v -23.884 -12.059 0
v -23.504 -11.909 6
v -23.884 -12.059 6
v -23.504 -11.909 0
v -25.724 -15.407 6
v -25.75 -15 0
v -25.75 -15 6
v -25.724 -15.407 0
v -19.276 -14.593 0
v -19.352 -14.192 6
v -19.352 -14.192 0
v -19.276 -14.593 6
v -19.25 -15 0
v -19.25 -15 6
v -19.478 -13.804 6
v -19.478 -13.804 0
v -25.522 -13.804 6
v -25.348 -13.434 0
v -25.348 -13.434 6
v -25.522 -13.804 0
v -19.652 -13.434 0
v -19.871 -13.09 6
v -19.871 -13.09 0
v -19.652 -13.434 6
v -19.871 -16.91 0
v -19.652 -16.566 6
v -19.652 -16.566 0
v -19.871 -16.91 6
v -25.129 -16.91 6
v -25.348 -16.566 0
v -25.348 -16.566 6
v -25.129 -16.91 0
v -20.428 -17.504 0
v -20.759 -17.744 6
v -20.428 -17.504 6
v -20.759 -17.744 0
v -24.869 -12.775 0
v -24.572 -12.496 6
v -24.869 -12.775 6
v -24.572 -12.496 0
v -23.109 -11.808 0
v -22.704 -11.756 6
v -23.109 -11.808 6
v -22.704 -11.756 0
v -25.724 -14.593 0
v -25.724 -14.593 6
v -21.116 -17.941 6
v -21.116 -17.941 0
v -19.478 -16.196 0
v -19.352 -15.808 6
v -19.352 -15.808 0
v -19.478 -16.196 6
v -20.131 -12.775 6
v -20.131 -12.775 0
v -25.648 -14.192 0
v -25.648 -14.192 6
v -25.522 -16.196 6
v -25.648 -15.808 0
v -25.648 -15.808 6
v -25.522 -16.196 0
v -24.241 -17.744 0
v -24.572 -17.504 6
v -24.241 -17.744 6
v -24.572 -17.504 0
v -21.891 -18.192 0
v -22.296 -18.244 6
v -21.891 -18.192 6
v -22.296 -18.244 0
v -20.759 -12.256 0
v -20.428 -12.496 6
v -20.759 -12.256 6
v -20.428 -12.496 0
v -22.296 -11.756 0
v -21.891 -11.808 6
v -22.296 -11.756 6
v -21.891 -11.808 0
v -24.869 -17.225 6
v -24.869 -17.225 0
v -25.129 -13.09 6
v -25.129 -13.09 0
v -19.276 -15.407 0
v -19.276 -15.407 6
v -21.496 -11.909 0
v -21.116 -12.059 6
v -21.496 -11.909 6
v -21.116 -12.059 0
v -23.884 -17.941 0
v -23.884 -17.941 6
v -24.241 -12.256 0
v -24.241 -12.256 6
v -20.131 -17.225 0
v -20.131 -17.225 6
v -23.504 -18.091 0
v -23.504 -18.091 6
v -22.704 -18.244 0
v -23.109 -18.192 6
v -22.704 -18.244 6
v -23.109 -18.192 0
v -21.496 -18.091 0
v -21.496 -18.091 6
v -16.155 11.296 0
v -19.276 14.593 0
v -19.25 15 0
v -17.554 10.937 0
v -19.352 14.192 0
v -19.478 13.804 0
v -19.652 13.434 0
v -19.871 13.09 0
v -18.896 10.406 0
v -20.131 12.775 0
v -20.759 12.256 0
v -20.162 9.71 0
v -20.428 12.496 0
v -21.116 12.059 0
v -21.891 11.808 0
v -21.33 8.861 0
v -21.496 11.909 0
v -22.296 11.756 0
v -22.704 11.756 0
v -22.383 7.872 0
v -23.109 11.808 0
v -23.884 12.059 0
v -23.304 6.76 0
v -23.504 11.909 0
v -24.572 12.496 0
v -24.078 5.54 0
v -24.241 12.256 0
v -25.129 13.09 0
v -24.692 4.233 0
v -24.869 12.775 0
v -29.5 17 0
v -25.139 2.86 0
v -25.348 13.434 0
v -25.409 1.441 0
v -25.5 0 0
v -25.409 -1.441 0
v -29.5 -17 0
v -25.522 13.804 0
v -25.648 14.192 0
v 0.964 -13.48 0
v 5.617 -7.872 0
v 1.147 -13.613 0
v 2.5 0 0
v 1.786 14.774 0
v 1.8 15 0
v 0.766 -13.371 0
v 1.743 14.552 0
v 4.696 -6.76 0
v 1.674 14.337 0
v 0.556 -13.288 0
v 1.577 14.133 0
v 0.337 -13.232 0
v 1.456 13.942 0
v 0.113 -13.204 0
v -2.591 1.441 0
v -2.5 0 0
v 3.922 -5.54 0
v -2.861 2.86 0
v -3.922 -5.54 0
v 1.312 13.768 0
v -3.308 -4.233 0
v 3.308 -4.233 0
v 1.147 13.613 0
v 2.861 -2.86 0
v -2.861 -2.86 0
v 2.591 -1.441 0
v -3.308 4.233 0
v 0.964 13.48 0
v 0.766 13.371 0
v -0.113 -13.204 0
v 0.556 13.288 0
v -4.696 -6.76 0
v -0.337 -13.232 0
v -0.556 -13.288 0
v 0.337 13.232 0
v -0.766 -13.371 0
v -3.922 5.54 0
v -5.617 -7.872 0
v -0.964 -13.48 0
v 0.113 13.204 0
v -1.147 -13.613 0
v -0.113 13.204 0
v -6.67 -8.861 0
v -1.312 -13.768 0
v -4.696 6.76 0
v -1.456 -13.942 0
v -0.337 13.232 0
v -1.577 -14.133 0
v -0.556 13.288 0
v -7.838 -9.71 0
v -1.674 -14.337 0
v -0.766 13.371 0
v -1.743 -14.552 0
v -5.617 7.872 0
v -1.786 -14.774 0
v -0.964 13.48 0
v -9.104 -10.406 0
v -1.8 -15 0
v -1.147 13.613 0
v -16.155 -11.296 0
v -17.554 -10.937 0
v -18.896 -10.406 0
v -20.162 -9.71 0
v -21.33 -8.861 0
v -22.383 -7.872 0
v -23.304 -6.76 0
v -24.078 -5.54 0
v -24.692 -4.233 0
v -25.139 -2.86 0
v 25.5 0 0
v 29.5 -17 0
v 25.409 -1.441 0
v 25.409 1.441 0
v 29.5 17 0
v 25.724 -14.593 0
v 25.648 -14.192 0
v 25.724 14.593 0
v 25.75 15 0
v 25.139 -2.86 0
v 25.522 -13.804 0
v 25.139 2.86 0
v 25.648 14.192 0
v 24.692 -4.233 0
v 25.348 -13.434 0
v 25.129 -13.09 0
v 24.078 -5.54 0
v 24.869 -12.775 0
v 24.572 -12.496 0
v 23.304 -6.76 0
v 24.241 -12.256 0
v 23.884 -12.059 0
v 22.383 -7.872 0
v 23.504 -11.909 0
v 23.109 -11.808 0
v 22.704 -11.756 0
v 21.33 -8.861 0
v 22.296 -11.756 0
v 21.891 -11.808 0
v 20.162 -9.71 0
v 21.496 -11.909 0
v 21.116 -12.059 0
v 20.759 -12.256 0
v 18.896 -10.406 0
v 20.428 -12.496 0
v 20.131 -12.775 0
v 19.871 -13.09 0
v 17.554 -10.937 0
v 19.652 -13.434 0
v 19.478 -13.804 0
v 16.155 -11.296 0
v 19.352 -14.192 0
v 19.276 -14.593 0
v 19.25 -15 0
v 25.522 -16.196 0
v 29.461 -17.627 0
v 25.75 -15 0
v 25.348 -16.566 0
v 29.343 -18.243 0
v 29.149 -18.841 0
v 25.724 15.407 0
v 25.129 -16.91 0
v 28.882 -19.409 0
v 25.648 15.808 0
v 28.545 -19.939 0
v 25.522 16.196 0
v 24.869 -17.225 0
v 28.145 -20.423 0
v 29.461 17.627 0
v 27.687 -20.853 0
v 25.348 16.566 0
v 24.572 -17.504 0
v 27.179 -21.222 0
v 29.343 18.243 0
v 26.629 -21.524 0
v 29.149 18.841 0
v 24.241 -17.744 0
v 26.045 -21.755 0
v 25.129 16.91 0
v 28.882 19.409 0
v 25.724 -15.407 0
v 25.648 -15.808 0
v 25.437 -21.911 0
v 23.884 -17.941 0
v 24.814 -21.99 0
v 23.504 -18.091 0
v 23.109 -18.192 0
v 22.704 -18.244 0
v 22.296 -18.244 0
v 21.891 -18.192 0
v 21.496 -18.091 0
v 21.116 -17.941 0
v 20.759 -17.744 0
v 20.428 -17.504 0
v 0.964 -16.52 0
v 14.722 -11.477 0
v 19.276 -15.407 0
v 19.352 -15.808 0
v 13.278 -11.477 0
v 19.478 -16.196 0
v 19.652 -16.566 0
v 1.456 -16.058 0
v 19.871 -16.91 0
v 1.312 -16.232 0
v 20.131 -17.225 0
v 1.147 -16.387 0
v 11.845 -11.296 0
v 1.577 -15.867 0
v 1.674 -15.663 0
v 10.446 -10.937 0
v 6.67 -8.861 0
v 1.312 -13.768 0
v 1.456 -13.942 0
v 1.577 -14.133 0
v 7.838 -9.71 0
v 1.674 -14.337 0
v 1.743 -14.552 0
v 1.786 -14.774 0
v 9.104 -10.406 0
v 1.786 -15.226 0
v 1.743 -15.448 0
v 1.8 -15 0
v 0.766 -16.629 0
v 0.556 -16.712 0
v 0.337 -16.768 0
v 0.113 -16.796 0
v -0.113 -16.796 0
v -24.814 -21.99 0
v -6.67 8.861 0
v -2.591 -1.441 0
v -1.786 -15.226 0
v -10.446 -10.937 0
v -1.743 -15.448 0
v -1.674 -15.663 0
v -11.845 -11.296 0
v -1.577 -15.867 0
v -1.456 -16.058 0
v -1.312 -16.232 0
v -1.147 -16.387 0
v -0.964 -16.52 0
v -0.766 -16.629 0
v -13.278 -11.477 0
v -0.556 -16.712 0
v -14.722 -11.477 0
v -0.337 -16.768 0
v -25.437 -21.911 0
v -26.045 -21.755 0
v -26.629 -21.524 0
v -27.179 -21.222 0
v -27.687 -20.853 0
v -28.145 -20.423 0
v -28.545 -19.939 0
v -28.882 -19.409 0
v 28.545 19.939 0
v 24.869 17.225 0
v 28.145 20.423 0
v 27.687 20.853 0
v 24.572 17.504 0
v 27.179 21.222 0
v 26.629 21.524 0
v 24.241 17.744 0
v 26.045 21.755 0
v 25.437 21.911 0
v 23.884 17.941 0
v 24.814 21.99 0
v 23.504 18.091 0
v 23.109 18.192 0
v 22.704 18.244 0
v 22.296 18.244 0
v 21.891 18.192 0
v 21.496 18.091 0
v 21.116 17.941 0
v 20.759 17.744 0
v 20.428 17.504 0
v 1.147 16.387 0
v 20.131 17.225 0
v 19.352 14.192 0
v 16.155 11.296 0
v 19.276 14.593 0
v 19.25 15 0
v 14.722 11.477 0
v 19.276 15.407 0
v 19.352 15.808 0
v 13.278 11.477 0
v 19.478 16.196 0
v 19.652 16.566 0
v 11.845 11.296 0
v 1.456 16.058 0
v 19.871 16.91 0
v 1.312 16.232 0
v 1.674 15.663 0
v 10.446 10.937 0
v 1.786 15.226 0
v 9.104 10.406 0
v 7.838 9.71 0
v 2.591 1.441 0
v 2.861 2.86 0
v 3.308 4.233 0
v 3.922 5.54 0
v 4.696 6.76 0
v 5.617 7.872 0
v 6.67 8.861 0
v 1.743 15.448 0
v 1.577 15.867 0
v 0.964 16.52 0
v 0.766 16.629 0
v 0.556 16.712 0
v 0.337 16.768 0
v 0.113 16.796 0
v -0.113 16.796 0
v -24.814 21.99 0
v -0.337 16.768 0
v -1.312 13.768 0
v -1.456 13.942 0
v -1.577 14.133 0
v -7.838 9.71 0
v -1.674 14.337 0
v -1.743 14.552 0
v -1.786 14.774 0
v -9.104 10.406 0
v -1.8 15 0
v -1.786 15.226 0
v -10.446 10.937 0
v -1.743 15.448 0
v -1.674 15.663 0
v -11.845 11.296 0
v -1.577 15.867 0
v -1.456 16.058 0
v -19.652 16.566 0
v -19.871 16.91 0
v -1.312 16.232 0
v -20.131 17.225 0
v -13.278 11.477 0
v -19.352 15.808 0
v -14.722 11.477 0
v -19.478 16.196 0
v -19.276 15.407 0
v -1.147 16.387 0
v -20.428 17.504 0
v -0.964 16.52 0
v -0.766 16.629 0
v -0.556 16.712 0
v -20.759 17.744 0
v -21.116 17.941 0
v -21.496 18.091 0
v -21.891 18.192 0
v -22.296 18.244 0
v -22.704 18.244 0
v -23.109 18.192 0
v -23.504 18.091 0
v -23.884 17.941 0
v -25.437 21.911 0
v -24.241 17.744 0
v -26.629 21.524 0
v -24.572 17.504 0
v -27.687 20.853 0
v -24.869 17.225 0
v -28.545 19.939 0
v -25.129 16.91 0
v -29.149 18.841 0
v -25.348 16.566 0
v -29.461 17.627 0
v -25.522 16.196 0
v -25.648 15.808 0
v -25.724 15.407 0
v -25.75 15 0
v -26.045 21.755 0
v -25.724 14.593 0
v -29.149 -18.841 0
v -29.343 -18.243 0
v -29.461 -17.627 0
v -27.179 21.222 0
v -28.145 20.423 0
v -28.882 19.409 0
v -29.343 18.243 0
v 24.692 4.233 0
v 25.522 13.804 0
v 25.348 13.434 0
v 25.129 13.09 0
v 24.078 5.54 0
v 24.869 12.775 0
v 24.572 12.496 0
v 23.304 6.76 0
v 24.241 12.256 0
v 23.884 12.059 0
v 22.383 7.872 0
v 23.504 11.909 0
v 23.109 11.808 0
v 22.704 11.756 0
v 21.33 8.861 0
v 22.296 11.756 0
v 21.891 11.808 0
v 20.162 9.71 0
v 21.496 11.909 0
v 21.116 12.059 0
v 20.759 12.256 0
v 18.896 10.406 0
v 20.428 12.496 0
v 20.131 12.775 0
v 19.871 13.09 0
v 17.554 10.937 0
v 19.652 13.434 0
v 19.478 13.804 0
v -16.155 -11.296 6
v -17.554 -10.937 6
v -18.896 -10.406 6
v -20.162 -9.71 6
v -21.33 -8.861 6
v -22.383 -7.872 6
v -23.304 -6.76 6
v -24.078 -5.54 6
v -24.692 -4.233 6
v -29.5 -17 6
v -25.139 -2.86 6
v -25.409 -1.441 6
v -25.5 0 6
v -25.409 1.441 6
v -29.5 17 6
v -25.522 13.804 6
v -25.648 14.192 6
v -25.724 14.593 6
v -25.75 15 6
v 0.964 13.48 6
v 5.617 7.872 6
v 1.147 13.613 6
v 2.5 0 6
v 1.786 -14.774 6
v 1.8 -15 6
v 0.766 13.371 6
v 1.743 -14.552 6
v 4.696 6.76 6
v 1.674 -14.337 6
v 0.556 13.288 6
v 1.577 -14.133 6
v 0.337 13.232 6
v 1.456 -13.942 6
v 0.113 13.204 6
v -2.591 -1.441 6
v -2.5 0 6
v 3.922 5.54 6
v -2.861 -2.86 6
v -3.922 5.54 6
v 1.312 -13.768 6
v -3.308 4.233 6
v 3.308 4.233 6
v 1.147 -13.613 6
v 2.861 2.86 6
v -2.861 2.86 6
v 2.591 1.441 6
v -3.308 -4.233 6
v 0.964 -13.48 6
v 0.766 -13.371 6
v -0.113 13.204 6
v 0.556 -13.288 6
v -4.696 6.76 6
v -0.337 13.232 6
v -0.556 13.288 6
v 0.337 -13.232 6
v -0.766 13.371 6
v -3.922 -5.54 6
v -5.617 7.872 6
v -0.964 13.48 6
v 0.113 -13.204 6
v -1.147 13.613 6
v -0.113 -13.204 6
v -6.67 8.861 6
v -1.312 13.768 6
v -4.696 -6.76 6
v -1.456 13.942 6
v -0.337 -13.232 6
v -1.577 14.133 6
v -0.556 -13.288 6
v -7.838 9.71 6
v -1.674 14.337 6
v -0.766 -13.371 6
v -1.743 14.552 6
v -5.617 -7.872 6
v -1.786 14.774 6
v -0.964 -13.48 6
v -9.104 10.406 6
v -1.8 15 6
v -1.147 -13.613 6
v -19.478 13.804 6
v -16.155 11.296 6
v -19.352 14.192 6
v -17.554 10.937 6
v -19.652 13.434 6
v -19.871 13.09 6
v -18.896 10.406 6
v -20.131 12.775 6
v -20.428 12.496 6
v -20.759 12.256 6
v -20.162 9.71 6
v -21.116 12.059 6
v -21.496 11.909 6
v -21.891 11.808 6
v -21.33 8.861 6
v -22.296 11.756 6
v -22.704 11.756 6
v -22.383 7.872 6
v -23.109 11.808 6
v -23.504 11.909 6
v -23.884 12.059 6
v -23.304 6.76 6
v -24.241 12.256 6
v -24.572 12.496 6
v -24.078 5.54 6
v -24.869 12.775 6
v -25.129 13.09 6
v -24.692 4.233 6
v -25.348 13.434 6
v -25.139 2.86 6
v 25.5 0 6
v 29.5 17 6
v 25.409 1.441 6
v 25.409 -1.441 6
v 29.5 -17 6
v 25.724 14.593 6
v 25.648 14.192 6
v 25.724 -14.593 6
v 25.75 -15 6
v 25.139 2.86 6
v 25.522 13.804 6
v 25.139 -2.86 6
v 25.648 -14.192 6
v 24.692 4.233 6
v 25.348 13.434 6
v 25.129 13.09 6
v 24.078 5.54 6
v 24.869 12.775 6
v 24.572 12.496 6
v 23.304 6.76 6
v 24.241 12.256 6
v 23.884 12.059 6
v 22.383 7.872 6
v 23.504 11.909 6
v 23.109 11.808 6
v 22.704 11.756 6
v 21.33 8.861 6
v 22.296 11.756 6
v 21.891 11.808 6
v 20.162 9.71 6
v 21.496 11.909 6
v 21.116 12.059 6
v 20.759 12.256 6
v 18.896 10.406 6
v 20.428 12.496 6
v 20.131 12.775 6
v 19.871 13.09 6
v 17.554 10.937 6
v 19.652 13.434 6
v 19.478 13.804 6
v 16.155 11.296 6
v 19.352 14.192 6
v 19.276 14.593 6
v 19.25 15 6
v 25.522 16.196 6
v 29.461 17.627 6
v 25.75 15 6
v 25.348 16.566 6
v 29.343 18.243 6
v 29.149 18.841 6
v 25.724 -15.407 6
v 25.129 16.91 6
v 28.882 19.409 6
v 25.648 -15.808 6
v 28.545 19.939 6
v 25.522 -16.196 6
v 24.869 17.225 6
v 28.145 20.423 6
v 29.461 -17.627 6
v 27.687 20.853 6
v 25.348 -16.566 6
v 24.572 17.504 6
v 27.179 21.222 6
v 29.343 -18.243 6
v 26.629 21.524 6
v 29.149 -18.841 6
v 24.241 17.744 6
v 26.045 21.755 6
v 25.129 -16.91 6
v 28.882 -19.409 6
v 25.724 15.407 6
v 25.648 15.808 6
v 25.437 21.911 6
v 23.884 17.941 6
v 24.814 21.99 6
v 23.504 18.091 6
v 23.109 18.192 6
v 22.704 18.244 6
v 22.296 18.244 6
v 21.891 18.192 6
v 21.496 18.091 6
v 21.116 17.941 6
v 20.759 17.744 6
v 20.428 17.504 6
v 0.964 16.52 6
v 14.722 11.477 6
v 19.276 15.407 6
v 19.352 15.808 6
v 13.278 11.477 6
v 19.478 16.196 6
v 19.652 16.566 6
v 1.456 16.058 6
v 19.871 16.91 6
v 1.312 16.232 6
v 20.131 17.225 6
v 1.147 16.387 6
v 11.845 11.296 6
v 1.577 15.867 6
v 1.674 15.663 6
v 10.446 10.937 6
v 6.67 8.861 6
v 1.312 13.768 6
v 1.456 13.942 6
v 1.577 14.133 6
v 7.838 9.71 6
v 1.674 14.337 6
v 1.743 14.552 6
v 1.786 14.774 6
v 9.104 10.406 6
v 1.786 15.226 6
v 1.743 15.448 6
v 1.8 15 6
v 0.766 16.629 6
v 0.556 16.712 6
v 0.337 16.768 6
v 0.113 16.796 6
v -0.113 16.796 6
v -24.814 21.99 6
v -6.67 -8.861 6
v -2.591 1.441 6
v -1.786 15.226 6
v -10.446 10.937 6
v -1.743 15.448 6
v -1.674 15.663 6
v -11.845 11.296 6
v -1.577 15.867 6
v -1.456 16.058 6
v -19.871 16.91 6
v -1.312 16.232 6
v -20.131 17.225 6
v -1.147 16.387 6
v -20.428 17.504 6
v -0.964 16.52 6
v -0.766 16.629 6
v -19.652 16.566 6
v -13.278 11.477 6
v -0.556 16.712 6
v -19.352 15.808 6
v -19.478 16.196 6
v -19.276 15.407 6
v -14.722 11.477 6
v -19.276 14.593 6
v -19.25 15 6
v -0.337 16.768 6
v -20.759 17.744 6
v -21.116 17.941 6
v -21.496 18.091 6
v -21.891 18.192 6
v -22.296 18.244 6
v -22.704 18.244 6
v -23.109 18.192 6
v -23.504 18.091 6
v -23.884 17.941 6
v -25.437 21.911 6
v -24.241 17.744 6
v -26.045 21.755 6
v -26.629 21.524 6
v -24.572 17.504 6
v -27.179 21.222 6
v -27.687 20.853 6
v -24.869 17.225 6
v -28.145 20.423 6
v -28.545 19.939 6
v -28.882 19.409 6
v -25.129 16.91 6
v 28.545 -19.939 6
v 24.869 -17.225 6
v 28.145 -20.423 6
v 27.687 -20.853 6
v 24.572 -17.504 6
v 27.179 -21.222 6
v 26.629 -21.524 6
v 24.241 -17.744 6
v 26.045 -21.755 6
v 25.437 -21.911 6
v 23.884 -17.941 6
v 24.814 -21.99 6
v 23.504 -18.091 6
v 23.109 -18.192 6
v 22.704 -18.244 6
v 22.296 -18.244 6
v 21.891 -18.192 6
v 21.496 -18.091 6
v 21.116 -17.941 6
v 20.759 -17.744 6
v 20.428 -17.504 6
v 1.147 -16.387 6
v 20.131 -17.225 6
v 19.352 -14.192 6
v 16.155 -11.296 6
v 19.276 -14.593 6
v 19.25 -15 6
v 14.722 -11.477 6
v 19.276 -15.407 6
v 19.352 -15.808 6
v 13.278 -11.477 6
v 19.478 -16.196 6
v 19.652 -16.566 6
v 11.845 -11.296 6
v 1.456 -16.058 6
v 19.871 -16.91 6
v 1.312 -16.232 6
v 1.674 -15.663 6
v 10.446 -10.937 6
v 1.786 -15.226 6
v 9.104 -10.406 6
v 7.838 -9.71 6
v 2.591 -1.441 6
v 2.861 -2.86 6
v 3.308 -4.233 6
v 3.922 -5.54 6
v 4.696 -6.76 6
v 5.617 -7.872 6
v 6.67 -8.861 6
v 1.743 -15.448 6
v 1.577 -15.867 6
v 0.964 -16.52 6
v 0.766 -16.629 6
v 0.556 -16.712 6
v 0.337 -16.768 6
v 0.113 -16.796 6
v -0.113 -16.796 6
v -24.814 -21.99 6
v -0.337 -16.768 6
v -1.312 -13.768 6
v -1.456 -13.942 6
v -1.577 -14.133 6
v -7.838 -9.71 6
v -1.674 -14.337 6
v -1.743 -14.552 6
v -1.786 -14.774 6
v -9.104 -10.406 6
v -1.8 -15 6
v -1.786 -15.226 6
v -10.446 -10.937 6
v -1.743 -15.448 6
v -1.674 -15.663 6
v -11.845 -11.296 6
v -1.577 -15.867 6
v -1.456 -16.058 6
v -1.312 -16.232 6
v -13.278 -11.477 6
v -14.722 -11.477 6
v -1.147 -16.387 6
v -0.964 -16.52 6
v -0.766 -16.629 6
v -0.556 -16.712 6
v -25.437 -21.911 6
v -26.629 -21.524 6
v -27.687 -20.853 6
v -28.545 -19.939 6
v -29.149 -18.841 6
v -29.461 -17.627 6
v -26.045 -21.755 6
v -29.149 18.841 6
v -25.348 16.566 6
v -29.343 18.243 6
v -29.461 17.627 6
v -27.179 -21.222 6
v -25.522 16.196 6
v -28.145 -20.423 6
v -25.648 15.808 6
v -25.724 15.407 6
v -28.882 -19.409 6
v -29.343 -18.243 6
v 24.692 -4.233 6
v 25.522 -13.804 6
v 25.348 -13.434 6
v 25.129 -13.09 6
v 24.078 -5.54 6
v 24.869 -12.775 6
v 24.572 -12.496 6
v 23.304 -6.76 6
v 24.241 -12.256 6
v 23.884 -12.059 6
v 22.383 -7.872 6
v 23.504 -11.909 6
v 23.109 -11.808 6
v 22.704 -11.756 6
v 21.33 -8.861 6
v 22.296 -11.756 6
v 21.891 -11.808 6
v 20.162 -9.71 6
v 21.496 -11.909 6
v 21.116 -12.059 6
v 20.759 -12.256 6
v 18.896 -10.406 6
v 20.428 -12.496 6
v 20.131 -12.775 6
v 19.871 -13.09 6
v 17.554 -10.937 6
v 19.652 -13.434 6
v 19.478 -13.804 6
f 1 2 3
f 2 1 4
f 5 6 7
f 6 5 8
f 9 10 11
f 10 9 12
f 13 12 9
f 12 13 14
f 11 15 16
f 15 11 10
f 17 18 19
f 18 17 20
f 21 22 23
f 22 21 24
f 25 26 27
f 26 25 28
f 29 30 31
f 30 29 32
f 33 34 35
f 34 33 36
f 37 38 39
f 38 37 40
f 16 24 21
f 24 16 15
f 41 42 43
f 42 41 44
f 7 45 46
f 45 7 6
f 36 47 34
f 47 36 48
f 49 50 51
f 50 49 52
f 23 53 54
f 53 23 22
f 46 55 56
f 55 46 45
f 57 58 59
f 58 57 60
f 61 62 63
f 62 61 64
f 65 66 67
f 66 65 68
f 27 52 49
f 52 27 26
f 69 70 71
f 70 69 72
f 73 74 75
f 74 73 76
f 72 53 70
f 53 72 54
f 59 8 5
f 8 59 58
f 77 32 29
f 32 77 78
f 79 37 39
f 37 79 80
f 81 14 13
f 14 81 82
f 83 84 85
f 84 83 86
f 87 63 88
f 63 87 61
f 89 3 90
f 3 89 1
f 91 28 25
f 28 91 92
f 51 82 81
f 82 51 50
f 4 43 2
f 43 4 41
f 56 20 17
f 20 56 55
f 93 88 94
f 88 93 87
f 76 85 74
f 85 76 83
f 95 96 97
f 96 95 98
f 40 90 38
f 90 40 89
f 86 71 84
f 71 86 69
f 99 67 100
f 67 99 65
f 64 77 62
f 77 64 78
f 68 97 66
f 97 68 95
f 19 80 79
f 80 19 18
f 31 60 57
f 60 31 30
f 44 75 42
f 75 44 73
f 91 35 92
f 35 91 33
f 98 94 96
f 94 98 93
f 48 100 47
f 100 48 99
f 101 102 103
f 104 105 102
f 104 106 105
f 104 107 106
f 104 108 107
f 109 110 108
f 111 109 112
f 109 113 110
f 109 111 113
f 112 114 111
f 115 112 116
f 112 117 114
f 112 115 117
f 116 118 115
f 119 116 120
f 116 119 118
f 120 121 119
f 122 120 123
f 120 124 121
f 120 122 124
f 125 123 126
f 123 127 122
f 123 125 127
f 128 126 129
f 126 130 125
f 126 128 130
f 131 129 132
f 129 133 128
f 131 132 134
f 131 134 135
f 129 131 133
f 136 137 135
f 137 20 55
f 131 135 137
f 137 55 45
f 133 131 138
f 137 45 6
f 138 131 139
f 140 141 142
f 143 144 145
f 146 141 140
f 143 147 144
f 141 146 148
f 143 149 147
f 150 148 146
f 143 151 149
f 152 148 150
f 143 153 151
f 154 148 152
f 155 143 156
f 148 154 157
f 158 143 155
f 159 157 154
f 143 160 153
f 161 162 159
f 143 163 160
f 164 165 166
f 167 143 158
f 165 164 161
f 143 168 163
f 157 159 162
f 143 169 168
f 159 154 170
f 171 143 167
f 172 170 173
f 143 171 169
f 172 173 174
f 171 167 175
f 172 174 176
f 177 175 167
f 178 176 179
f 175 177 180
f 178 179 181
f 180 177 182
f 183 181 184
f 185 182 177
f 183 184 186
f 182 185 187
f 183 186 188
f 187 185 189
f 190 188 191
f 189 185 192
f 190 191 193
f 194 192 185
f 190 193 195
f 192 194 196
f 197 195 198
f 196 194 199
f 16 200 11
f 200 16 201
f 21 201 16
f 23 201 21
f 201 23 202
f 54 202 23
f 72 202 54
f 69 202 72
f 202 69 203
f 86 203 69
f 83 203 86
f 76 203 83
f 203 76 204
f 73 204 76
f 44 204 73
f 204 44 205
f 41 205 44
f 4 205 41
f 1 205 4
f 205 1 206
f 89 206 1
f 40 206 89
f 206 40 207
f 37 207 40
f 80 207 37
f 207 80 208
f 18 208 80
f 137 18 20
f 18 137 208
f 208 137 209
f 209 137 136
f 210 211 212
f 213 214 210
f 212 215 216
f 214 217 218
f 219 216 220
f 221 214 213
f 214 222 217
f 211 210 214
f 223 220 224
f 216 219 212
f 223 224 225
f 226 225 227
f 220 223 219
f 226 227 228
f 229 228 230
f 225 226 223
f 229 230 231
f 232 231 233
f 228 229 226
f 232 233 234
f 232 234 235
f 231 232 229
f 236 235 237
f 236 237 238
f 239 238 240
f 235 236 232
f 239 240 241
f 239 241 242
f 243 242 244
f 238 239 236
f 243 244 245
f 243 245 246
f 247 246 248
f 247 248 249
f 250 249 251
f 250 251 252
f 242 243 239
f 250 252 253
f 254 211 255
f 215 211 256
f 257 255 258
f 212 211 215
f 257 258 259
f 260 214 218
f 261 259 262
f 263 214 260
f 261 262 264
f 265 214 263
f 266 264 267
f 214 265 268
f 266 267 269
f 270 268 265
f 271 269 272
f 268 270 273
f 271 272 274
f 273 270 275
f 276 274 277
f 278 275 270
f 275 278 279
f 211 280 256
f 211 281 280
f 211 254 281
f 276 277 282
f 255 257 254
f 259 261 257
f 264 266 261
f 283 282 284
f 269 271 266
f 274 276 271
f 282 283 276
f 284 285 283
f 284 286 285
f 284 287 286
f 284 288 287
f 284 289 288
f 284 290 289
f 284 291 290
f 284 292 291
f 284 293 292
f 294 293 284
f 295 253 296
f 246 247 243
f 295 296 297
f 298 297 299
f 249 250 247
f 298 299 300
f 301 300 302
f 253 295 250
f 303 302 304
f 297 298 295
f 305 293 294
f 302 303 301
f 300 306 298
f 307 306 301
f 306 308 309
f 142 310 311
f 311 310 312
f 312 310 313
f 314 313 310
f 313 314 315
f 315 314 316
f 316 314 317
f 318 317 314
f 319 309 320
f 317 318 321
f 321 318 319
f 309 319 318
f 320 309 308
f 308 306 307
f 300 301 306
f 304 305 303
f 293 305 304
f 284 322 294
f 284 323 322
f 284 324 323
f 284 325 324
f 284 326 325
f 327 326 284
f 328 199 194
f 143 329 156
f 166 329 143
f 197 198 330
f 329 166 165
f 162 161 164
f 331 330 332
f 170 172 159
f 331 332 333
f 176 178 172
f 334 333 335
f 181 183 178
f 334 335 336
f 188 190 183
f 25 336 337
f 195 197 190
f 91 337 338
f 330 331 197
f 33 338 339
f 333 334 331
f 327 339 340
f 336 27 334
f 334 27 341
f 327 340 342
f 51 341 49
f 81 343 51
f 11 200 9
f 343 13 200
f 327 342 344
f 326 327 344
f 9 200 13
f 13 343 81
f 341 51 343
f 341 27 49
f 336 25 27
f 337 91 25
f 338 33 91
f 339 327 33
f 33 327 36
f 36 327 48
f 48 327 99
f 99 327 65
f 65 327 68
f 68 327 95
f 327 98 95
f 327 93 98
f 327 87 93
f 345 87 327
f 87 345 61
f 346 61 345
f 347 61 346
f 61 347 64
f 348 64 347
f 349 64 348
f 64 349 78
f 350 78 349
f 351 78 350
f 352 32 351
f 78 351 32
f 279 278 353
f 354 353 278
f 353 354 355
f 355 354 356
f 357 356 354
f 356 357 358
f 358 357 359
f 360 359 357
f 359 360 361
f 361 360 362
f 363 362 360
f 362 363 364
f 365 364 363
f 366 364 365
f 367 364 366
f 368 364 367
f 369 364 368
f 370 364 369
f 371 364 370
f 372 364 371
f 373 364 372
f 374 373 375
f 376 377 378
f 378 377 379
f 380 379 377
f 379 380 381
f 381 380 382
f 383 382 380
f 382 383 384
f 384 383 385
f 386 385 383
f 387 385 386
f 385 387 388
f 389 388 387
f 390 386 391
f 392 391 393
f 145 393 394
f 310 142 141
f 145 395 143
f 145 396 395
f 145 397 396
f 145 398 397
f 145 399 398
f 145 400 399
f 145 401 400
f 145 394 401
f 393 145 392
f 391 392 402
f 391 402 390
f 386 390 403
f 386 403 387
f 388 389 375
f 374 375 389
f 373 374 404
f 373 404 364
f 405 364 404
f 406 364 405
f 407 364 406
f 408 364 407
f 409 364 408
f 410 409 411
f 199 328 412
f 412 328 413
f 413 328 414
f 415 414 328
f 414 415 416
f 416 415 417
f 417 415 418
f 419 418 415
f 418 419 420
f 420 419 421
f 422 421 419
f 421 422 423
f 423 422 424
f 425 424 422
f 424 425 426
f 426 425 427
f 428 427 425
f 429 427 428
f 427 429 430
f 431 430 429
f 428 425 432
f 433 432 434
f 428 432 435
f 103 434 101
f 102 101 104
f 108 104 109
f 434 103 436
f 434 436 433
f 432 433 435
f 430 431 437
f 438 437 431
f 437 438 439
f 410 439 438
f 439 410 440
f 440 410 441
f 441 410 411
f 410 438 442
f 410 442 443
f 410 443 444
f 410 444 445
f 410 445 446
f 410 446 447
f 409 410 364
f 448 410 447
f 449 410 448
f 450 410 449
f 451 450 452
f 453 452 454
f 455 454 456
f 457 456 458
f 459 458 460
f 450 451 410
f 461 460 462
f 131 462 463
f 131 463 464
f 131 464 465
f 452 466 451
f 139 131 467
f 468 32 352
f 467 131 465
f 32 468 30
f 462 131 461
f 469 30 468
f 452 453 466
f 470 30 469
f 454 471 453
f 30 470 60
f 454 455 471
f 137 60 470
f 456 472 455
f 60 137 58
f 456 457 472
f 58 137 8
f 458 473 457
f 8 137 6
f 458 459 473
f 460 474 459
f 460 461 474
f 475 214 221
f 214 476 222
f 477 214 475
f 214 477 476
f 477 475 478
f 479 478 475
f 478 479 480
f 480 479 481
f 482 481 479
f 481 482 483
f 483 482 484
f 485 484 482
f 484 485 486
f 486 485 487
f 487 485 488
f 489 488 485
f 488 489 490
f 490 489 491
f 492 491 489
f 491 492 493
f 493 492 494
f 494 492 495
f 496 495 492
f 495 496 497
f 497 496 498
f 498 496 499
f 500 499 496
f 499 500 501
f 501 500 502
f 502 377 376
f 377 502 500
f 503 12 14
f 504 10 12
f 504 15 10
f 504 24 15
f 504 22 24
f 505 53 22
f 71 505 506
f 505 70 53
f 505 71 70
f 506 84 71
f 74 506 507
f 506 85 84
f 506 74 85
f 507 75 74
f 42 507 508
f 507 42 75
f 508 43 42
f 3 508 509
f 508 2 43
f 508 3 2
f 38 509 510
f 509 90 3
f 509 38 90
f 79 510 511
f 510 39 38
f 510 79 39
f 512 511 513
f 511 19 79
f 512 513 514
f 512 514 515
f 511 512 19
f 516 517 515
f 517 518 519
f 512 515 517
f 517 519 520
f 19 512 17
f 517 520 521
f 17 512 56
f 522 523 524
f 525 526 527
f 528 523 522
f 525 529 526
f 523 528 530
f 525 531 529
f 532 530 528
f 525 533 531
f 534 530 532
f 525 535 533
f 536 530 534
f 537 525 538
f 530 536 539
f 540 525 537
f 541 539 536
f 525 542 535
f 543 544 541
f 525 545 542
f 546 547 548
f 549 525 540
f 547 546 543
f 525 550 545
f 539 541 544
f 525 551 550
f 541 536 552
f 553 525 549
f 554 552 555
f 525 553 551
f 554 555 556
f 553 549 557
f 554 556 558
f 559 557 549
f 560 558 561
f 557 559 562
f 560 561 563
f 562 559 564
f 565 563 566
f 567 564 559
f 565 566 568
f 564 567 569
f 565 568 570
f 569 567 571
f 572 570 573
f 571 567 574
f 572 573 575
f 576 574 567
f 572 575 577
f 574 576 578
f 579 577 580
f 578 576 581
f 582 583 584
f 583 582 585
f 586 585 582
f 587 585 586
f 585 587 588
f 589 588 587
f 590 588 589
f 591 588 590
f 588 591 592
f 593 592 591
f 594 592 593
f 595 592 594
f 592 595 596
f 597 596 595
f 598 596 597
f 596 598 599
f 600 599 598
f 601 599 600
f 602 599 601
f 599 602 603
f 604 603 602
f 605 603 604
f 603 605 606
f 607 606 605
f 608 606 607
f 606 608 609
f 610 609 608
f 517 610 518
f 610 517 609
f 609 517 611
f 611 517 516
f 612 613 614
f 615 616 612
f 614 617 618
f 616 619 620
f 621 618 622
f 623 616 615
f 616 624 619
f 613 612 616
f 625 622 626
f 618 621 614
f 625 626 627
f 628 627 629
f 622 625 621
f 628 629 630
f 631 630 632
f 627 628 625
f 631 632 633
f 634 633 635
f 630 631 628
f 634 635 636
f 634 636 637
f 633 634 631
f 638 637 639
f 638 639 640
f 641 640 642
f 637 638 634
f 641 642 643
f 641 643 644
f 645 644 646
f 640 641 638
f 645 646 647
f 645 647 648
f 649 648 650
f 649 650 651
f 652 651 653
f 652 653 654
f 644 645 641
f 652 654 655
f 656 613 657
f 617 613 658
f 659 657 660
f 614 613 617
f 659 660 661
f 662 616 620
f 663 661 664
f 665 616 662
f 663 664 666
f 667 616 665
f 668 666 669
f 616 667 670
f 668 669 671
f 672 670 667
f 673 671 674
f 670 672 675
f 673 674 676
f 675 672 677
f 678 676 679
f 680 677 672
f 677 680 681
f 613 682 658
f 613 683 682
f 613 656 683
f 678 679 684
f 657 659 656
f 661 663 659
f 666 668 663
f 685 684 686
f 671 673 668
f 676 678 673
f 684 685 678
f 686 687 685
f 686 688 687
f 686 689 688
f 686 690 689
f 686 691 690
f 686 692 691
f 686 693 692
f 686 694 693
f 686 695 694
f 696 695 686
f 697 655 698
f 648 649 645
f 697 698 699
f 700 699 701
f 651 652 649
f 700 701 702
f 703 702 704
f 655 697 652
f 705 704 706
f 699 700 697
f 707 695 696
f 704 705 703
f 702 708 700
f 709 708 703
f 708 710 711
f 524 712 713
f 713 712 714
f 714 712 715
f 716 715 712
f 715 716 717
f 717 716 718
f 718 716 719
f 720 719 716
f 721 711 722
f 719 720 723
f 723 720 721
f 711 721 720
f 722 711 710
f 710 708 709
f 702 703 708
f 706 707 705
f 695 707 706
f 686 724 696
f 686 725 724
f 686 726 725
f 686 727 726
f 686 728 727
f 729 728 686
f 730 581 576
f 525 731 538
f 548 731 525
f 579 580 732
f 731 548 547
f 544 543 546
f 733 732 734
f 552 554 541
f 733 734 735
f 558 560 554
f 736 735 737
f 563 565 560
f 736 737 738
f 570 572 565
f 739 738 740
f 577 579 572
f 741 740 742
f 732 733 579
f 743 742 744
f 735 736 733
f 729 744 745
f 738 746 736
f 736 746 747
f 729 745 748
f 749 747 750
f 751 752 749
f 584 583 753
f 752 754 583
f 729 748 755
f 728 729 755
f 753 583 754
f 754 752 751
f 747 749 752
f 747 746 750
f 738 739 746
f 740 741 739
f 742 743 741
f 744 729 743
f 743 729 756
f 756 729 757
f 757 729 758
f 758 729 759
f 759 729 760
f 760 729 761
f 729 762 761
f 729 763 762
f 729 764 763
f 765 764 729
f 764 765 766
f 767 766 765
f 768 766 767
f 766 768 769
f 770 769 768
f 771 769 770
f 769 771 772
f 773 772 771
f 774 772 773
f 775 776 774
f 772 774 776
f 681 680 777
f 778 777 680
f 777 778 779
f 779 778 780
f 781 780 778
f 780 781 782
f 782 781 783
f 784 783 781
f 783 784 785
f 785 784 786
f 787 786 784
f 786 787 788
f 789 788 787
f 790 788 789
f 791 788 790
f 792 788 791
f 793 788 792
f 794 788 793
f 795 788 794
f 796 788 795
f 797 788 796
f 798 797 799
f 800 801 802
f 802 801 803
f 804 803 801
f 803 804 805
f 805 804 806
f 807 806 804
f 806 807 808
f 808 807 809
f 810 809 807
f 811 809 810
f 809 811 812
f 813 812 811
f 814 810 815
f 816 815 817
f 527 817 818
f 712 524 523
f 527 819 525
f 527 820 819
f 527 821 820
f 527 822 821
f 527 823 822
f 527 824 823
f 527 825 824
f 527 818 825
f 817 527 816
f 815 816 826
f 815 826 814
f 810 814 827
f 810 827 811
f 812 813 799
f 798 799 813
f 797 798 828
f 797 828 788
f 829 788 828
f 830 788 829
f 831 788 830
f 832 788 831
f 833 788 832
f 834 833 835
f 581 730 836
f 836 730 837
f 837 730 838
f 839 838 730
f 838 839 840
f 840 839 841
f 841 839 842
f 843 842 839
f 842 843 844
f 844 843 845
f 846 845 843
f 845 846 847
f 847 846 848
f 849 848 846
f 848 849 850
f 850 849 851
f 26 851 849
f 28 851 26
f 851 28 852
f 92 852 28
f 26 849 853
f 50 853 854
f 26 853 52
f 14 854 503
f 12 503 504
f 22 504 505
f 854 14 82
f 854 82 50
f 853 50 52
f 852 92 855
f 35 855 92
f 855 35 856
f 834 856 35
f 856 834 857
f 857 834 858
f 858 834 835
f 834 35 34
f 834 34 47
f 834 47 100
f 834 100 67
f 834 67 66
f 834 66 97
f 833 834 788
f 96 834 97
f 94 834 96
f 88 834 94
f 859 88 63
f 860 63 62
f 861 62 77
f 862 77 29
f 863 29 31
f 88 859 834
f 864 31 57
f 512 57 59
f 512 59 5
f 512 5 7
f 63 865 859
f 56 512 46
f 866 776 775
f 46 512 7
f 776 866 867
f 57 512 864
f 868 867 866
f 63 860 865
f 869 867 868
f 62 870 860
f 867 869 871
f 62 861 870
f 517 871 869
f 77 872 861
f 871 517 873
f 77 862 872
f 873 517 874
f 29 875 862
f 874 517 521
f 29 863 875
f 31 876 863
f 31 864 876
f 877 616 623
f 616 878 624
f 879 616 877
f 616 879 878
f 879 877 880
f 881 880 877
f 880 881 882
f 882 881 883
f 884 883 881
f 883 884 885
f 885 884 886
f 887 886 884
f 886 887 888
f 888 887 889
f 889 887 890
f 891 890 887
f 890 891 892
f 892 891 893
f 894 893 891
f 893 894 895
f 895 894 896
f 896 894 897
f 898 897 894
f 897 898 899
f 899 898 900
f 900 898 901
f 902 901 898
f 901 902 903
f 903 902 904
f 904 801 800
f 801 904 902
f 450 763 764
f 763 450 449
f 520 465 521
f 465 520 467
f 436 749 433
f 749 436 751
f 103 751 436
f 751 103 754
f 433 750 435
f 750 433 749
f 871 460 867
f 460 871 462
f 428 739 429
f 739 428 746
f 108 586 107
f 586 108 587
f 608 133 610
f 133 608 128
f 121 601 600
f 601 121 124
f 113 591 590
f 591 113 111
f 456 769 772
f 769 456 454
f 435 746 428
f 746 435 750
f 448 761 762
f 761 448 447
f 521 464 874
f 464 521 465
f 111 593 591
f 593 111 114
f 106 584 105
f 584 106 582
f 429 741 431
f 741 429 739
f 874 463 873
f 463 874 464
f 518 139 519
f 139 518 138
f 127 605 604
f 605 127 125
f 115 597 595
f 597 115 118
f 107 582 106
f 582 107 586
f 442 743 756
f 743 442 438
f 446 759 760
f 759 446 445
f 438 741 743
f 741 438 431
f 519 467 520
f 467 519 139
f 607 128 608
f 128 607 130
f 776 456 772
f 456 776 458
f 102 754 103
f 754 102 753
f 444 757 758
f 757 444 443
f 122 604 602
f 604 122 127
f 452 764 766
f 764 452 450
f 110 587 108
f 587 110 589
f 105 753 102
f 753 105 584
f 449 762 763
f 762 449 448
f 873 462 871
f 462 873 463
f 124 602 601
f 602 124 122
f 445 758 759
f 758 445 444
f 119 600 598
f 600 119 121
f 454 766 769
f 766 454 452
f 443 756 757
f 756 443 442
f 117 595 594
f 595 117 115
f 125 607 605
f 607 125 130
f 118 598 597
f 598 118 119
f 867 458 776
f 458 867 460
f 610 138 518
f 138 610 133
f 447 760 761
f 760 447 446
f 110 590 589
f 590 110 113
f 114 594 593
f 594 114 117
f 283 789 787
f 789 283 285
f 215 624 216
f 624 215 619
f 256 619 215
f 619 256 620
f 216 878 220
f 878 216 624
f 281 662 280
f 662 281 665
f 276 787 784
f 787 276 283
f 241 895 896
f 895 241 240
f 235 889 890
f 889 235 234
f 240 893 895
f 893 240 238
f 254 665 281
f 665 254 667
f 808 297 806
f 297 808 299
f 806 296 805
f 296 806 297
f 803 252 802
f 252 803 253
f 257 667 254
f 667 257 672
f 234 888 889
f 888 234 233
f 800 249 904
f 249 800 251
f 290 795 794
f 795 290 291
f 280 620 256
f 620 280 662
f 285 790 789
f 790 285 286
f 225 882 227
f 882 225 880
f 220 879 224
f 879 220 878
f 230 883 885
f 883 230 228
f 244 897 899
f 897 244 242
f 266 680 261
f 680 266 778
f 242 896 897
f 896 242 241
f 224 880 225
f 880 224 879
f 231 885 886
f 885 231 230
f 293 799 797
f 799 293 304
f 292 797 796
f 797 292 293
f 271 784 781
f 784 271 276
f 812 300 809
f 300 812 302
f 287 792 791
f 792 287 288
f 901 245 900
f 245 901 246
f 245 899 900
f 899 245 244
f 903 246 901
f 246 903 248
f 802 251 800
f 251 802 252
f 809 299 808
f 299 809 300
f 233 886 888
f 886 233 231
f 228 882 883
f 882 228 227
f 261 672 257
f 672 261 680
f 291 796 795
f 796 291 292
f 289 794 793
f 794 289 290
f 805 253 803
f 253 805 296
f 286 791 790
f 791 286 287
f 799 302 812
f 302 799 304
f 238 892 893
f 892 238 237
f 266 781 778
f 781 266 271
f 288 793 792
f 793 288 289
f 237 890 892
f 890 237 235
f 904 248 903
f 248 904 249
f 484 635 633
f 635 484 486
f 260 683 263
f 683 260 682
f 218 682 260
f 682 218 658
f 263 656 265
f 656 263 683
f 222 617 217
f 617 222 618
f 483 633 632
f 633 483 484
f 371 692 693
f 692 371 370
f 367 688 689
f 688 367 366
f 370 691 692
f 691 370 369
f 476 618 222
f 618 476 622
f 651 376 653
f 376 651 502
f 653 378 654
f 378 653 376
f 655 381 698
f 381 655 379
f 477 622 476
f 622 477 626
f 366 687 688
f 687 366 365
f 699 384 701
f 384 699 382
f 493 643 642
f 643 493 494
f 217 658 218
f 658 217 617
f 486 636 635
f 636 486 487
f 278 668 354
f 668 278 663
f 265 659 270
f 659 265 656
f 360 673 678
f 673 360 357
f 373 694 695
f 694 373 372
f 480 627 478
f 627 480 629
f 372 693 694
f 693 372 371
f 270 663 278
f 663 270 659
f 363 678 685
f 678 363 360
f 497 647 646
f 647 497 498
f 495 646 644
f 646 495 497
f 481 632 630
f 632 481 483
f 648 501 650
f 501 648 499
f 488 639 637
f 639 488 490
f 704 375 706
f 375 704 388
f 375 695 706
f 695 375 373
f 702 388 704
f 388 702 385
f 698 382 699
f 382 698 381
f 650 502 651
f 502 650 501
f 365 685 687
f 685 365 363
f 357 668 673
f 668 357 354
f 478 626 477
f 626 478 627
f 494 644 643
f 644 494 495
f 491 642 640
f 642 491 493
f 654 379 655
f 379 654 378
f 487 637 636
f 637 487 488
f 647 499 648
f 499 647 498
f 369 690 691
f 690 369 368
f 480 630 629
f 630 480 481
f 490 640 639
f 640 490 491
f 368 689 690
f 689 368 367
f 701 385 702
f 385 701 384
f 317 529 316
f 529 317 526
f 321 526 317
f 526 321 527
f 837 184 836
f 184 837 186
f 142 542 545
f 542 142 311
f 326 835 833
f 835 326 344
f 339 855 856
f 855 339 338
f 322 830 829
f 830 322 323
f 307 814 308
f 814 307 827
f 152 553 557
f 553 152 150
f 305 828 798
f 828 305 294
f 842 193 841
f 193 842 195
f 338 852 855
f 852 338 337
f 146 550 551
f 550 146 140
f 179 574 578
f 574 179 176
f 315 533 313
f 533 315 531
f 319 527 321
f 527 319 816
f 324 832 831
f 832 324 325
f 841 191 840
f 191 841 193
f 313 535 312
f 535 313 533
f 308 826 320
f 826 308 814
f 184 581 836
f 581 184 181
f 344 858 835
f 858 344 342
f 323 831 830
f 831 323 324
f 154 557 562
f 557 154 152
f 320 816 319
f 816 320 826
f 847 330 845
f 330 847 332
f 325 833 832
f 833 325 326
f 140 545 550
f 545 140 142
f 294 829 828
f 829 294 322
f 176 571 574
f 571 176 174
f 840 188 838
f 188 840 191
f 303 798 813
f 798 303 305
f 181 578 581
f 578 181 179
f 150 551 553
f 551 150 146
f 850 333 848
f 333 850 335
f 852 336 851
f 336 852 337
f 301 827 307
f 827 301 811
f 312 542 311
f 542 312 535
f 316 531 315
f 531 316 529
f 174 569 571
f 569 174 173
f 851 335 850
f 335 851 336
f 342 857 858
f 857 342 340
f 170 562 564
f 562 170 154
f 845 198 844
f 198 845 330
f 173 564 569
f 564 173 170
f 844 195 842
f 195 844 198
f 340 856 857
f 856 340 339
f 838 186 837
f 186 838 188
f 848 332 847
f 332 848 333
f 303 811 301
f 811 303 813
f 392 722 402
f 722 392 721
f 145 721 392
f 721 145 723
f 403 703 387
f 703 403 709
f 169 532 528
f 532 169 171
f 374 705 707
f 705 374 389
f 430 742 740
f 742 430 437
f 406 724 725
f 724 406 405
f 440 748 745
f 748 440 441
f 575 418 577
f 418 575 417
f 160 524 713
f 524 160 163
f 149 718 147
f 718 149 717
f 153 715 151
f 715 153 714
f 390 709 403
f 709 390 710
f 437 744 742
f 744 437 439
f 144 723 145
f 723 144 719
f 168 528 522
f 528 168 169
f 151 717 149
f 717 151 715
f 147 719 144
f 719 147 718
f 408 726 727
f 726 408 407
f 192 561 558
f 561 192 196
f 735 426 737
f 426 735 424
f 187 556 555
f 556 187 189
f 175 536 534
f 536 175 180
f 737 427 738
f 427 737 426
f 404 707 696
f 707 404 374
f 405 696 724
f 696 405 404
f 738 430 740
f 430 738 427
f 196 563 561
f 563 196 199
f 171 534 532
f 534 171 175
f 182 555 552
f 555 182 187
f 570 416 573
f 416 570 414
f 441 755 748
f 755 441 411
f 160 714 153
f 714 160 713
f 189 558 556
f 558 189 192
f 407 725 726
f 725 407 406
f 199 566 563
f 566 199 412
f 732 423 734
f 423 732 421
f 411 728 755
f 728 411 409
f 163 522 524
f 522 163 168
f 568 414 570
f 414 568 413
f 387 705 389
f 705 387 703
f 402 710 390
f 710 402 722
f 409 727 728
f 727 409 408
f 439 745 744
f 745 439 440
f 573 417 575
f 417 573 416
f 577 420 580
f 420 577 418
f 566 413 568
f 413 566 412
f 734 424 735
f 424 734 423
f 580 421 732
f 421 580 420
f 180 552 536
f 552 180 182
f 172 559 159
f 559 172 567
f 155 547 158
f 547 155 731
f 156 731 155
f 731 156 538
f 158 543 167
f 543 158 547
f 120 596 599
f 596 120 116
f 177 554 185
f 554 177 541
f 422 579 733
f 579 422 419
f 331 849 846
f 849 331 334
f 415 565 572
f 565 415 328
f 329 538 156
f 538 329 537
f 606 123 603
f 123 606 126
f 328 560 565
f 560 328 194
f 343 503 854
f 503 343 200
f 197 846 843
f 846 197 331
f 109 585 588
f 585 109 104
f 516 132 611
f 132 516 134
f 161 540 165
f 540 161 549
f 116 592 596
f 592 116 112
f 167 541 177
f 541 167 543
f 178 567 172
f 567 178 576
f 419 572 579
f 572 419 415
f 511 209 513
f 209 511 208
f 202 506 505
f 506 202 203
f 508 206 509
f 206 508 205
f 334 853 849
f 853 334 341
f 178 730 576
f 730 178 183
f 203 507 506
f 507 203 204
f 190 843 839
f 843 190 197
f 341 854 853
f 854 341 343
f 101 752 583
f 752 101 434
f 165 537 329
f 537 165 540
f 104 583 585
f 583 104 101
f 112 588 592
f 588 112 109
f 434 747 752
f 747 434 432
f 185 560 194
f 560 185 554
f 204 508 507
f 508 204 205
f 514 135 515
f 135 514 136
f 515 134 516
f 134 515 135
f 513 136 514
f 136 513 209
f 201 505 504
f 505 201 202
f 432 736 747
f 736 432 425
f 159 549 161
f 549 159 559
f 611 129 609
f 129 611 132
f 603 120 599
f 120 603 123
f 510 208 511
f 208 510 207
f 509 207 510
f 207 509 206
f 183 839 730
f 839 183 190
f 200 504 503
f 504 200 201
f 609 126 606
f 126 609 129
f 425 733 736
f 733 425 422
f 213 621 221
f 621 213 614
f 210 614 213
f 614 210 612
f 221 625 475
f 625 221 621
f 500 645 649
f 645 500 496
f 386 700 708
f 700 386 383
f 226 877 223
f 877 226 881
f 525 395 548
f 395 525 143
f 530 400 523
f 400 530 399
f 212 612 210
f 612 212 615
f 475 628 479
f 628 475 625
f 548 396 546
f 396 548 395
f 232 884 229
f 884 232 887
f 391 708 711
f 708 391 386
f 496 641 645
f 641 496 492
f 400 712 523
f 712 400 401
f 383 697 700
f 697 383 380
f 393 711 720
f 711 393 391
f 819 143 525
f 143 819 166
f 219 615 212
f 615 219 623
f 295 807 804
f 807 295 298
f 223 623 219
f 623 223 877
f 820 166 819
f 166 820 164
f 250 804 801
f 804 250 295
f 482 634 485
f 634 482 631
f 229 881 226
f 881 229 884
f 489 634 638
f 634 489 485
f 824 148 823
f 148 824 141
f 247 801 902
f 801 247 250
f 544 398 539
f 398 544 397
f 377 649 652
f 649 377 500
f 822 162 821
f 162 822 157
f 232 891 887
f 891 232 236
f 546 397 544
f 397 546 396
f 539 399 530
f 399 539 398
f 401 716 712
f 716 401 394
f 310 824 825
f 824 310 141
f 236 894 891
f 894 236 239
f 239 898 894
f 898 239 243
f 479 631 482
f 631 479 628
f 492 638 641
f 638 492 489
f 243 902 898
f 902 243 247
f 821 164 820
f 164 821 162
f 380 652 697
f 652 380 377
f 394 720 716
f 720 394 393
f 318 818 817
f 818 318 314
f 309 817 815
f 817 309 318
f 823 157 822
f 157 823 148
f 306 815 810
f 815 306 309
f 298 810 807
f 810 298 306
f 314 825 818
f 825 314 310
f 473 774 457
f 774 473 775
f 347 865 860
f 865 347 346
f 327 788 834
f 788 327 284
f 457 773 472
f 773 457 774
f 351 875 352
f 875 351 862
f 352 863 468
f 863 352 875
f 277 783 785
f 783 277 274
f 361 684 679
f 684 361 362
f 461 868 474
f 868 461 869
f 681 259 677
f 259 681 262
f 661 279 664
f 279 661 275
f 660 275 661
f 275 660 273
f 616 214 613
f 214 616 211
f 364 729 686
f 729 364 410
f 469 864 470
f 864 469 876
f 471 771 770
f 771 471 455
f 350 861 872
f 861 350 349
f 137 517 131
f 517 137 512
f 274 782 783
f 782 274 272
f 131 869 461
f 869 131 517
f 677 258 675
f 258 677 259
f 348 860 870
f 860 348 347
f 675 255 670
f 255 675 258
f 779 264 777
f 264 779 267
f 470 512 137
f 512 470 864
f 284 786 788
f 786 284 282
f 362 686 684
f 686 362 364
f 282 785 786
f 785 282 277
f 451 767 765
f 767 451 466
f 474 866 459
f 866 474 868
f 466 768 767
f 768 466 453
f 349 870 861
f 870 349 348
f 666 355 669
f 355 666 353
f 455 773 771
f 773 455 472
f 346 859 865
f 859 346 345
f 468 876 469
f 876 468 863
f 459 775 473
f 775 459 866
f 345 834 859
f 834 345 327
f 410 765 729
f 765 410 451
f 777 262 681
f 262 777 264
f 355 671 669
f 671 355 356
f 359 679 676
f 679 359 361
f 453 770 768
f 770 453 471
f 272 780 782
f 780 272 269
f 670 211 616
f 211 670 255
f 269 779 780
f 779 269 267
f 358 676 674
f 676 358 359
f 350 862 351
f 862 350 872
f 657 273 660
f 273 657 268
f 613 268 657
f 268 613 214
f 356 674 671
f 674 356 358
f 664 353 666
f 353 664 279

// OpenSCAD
$fn = 50;

difference() {
	union() {
		hull() {
			translate(v = [-24.5, 17.0, 0]) {
				cylinder(h = 6, r = 5);
			}
			translate(v = [24.5, 17.0, 0]) {
				cylinder(h = 6, r = 5);
			}
			translate(v = [-24.5, -17.0, 0]) {
				cylinder(h = 6, r = 5);
			}
			translate(v = [24.5, -17.0, 0]) {
				cylinder(h = 6, r = 5);
			}
		}
	}
	union() {
		translate(v = [-22.5, -15.0, 0]) {
			cylinder(h = 6, r = 3.25);
		}
		translate(v = [-22.5, 15.0, 0]) {
			cylinder(h = 6, r = 3.25);
		}
		translate(v = [22.5, -15.0, 0]) {
			cylinder(h = 6, r = 3.25);
		}
		translate(v = [22.5, 15.0, 0]) {
			cylinder(h = 6, r = 3.25);
		}
		translate(v = [0.0, -15.0, 0]) {
			cylinder(h = 6, r = 1.8);
		}
		translate(v = [0.0, 15.0, 0]) {
			cylinder(h = 6, r = 1.8);
		}
		translate(v = [-14.0, 0, 0.0]) {
			cylinder(h = 6, r = 11.5);
		}
		translate(v = [14.0, 0, 0.0]) {
			cylinder(h = 6, r = 11.5);
		}
	}
}
